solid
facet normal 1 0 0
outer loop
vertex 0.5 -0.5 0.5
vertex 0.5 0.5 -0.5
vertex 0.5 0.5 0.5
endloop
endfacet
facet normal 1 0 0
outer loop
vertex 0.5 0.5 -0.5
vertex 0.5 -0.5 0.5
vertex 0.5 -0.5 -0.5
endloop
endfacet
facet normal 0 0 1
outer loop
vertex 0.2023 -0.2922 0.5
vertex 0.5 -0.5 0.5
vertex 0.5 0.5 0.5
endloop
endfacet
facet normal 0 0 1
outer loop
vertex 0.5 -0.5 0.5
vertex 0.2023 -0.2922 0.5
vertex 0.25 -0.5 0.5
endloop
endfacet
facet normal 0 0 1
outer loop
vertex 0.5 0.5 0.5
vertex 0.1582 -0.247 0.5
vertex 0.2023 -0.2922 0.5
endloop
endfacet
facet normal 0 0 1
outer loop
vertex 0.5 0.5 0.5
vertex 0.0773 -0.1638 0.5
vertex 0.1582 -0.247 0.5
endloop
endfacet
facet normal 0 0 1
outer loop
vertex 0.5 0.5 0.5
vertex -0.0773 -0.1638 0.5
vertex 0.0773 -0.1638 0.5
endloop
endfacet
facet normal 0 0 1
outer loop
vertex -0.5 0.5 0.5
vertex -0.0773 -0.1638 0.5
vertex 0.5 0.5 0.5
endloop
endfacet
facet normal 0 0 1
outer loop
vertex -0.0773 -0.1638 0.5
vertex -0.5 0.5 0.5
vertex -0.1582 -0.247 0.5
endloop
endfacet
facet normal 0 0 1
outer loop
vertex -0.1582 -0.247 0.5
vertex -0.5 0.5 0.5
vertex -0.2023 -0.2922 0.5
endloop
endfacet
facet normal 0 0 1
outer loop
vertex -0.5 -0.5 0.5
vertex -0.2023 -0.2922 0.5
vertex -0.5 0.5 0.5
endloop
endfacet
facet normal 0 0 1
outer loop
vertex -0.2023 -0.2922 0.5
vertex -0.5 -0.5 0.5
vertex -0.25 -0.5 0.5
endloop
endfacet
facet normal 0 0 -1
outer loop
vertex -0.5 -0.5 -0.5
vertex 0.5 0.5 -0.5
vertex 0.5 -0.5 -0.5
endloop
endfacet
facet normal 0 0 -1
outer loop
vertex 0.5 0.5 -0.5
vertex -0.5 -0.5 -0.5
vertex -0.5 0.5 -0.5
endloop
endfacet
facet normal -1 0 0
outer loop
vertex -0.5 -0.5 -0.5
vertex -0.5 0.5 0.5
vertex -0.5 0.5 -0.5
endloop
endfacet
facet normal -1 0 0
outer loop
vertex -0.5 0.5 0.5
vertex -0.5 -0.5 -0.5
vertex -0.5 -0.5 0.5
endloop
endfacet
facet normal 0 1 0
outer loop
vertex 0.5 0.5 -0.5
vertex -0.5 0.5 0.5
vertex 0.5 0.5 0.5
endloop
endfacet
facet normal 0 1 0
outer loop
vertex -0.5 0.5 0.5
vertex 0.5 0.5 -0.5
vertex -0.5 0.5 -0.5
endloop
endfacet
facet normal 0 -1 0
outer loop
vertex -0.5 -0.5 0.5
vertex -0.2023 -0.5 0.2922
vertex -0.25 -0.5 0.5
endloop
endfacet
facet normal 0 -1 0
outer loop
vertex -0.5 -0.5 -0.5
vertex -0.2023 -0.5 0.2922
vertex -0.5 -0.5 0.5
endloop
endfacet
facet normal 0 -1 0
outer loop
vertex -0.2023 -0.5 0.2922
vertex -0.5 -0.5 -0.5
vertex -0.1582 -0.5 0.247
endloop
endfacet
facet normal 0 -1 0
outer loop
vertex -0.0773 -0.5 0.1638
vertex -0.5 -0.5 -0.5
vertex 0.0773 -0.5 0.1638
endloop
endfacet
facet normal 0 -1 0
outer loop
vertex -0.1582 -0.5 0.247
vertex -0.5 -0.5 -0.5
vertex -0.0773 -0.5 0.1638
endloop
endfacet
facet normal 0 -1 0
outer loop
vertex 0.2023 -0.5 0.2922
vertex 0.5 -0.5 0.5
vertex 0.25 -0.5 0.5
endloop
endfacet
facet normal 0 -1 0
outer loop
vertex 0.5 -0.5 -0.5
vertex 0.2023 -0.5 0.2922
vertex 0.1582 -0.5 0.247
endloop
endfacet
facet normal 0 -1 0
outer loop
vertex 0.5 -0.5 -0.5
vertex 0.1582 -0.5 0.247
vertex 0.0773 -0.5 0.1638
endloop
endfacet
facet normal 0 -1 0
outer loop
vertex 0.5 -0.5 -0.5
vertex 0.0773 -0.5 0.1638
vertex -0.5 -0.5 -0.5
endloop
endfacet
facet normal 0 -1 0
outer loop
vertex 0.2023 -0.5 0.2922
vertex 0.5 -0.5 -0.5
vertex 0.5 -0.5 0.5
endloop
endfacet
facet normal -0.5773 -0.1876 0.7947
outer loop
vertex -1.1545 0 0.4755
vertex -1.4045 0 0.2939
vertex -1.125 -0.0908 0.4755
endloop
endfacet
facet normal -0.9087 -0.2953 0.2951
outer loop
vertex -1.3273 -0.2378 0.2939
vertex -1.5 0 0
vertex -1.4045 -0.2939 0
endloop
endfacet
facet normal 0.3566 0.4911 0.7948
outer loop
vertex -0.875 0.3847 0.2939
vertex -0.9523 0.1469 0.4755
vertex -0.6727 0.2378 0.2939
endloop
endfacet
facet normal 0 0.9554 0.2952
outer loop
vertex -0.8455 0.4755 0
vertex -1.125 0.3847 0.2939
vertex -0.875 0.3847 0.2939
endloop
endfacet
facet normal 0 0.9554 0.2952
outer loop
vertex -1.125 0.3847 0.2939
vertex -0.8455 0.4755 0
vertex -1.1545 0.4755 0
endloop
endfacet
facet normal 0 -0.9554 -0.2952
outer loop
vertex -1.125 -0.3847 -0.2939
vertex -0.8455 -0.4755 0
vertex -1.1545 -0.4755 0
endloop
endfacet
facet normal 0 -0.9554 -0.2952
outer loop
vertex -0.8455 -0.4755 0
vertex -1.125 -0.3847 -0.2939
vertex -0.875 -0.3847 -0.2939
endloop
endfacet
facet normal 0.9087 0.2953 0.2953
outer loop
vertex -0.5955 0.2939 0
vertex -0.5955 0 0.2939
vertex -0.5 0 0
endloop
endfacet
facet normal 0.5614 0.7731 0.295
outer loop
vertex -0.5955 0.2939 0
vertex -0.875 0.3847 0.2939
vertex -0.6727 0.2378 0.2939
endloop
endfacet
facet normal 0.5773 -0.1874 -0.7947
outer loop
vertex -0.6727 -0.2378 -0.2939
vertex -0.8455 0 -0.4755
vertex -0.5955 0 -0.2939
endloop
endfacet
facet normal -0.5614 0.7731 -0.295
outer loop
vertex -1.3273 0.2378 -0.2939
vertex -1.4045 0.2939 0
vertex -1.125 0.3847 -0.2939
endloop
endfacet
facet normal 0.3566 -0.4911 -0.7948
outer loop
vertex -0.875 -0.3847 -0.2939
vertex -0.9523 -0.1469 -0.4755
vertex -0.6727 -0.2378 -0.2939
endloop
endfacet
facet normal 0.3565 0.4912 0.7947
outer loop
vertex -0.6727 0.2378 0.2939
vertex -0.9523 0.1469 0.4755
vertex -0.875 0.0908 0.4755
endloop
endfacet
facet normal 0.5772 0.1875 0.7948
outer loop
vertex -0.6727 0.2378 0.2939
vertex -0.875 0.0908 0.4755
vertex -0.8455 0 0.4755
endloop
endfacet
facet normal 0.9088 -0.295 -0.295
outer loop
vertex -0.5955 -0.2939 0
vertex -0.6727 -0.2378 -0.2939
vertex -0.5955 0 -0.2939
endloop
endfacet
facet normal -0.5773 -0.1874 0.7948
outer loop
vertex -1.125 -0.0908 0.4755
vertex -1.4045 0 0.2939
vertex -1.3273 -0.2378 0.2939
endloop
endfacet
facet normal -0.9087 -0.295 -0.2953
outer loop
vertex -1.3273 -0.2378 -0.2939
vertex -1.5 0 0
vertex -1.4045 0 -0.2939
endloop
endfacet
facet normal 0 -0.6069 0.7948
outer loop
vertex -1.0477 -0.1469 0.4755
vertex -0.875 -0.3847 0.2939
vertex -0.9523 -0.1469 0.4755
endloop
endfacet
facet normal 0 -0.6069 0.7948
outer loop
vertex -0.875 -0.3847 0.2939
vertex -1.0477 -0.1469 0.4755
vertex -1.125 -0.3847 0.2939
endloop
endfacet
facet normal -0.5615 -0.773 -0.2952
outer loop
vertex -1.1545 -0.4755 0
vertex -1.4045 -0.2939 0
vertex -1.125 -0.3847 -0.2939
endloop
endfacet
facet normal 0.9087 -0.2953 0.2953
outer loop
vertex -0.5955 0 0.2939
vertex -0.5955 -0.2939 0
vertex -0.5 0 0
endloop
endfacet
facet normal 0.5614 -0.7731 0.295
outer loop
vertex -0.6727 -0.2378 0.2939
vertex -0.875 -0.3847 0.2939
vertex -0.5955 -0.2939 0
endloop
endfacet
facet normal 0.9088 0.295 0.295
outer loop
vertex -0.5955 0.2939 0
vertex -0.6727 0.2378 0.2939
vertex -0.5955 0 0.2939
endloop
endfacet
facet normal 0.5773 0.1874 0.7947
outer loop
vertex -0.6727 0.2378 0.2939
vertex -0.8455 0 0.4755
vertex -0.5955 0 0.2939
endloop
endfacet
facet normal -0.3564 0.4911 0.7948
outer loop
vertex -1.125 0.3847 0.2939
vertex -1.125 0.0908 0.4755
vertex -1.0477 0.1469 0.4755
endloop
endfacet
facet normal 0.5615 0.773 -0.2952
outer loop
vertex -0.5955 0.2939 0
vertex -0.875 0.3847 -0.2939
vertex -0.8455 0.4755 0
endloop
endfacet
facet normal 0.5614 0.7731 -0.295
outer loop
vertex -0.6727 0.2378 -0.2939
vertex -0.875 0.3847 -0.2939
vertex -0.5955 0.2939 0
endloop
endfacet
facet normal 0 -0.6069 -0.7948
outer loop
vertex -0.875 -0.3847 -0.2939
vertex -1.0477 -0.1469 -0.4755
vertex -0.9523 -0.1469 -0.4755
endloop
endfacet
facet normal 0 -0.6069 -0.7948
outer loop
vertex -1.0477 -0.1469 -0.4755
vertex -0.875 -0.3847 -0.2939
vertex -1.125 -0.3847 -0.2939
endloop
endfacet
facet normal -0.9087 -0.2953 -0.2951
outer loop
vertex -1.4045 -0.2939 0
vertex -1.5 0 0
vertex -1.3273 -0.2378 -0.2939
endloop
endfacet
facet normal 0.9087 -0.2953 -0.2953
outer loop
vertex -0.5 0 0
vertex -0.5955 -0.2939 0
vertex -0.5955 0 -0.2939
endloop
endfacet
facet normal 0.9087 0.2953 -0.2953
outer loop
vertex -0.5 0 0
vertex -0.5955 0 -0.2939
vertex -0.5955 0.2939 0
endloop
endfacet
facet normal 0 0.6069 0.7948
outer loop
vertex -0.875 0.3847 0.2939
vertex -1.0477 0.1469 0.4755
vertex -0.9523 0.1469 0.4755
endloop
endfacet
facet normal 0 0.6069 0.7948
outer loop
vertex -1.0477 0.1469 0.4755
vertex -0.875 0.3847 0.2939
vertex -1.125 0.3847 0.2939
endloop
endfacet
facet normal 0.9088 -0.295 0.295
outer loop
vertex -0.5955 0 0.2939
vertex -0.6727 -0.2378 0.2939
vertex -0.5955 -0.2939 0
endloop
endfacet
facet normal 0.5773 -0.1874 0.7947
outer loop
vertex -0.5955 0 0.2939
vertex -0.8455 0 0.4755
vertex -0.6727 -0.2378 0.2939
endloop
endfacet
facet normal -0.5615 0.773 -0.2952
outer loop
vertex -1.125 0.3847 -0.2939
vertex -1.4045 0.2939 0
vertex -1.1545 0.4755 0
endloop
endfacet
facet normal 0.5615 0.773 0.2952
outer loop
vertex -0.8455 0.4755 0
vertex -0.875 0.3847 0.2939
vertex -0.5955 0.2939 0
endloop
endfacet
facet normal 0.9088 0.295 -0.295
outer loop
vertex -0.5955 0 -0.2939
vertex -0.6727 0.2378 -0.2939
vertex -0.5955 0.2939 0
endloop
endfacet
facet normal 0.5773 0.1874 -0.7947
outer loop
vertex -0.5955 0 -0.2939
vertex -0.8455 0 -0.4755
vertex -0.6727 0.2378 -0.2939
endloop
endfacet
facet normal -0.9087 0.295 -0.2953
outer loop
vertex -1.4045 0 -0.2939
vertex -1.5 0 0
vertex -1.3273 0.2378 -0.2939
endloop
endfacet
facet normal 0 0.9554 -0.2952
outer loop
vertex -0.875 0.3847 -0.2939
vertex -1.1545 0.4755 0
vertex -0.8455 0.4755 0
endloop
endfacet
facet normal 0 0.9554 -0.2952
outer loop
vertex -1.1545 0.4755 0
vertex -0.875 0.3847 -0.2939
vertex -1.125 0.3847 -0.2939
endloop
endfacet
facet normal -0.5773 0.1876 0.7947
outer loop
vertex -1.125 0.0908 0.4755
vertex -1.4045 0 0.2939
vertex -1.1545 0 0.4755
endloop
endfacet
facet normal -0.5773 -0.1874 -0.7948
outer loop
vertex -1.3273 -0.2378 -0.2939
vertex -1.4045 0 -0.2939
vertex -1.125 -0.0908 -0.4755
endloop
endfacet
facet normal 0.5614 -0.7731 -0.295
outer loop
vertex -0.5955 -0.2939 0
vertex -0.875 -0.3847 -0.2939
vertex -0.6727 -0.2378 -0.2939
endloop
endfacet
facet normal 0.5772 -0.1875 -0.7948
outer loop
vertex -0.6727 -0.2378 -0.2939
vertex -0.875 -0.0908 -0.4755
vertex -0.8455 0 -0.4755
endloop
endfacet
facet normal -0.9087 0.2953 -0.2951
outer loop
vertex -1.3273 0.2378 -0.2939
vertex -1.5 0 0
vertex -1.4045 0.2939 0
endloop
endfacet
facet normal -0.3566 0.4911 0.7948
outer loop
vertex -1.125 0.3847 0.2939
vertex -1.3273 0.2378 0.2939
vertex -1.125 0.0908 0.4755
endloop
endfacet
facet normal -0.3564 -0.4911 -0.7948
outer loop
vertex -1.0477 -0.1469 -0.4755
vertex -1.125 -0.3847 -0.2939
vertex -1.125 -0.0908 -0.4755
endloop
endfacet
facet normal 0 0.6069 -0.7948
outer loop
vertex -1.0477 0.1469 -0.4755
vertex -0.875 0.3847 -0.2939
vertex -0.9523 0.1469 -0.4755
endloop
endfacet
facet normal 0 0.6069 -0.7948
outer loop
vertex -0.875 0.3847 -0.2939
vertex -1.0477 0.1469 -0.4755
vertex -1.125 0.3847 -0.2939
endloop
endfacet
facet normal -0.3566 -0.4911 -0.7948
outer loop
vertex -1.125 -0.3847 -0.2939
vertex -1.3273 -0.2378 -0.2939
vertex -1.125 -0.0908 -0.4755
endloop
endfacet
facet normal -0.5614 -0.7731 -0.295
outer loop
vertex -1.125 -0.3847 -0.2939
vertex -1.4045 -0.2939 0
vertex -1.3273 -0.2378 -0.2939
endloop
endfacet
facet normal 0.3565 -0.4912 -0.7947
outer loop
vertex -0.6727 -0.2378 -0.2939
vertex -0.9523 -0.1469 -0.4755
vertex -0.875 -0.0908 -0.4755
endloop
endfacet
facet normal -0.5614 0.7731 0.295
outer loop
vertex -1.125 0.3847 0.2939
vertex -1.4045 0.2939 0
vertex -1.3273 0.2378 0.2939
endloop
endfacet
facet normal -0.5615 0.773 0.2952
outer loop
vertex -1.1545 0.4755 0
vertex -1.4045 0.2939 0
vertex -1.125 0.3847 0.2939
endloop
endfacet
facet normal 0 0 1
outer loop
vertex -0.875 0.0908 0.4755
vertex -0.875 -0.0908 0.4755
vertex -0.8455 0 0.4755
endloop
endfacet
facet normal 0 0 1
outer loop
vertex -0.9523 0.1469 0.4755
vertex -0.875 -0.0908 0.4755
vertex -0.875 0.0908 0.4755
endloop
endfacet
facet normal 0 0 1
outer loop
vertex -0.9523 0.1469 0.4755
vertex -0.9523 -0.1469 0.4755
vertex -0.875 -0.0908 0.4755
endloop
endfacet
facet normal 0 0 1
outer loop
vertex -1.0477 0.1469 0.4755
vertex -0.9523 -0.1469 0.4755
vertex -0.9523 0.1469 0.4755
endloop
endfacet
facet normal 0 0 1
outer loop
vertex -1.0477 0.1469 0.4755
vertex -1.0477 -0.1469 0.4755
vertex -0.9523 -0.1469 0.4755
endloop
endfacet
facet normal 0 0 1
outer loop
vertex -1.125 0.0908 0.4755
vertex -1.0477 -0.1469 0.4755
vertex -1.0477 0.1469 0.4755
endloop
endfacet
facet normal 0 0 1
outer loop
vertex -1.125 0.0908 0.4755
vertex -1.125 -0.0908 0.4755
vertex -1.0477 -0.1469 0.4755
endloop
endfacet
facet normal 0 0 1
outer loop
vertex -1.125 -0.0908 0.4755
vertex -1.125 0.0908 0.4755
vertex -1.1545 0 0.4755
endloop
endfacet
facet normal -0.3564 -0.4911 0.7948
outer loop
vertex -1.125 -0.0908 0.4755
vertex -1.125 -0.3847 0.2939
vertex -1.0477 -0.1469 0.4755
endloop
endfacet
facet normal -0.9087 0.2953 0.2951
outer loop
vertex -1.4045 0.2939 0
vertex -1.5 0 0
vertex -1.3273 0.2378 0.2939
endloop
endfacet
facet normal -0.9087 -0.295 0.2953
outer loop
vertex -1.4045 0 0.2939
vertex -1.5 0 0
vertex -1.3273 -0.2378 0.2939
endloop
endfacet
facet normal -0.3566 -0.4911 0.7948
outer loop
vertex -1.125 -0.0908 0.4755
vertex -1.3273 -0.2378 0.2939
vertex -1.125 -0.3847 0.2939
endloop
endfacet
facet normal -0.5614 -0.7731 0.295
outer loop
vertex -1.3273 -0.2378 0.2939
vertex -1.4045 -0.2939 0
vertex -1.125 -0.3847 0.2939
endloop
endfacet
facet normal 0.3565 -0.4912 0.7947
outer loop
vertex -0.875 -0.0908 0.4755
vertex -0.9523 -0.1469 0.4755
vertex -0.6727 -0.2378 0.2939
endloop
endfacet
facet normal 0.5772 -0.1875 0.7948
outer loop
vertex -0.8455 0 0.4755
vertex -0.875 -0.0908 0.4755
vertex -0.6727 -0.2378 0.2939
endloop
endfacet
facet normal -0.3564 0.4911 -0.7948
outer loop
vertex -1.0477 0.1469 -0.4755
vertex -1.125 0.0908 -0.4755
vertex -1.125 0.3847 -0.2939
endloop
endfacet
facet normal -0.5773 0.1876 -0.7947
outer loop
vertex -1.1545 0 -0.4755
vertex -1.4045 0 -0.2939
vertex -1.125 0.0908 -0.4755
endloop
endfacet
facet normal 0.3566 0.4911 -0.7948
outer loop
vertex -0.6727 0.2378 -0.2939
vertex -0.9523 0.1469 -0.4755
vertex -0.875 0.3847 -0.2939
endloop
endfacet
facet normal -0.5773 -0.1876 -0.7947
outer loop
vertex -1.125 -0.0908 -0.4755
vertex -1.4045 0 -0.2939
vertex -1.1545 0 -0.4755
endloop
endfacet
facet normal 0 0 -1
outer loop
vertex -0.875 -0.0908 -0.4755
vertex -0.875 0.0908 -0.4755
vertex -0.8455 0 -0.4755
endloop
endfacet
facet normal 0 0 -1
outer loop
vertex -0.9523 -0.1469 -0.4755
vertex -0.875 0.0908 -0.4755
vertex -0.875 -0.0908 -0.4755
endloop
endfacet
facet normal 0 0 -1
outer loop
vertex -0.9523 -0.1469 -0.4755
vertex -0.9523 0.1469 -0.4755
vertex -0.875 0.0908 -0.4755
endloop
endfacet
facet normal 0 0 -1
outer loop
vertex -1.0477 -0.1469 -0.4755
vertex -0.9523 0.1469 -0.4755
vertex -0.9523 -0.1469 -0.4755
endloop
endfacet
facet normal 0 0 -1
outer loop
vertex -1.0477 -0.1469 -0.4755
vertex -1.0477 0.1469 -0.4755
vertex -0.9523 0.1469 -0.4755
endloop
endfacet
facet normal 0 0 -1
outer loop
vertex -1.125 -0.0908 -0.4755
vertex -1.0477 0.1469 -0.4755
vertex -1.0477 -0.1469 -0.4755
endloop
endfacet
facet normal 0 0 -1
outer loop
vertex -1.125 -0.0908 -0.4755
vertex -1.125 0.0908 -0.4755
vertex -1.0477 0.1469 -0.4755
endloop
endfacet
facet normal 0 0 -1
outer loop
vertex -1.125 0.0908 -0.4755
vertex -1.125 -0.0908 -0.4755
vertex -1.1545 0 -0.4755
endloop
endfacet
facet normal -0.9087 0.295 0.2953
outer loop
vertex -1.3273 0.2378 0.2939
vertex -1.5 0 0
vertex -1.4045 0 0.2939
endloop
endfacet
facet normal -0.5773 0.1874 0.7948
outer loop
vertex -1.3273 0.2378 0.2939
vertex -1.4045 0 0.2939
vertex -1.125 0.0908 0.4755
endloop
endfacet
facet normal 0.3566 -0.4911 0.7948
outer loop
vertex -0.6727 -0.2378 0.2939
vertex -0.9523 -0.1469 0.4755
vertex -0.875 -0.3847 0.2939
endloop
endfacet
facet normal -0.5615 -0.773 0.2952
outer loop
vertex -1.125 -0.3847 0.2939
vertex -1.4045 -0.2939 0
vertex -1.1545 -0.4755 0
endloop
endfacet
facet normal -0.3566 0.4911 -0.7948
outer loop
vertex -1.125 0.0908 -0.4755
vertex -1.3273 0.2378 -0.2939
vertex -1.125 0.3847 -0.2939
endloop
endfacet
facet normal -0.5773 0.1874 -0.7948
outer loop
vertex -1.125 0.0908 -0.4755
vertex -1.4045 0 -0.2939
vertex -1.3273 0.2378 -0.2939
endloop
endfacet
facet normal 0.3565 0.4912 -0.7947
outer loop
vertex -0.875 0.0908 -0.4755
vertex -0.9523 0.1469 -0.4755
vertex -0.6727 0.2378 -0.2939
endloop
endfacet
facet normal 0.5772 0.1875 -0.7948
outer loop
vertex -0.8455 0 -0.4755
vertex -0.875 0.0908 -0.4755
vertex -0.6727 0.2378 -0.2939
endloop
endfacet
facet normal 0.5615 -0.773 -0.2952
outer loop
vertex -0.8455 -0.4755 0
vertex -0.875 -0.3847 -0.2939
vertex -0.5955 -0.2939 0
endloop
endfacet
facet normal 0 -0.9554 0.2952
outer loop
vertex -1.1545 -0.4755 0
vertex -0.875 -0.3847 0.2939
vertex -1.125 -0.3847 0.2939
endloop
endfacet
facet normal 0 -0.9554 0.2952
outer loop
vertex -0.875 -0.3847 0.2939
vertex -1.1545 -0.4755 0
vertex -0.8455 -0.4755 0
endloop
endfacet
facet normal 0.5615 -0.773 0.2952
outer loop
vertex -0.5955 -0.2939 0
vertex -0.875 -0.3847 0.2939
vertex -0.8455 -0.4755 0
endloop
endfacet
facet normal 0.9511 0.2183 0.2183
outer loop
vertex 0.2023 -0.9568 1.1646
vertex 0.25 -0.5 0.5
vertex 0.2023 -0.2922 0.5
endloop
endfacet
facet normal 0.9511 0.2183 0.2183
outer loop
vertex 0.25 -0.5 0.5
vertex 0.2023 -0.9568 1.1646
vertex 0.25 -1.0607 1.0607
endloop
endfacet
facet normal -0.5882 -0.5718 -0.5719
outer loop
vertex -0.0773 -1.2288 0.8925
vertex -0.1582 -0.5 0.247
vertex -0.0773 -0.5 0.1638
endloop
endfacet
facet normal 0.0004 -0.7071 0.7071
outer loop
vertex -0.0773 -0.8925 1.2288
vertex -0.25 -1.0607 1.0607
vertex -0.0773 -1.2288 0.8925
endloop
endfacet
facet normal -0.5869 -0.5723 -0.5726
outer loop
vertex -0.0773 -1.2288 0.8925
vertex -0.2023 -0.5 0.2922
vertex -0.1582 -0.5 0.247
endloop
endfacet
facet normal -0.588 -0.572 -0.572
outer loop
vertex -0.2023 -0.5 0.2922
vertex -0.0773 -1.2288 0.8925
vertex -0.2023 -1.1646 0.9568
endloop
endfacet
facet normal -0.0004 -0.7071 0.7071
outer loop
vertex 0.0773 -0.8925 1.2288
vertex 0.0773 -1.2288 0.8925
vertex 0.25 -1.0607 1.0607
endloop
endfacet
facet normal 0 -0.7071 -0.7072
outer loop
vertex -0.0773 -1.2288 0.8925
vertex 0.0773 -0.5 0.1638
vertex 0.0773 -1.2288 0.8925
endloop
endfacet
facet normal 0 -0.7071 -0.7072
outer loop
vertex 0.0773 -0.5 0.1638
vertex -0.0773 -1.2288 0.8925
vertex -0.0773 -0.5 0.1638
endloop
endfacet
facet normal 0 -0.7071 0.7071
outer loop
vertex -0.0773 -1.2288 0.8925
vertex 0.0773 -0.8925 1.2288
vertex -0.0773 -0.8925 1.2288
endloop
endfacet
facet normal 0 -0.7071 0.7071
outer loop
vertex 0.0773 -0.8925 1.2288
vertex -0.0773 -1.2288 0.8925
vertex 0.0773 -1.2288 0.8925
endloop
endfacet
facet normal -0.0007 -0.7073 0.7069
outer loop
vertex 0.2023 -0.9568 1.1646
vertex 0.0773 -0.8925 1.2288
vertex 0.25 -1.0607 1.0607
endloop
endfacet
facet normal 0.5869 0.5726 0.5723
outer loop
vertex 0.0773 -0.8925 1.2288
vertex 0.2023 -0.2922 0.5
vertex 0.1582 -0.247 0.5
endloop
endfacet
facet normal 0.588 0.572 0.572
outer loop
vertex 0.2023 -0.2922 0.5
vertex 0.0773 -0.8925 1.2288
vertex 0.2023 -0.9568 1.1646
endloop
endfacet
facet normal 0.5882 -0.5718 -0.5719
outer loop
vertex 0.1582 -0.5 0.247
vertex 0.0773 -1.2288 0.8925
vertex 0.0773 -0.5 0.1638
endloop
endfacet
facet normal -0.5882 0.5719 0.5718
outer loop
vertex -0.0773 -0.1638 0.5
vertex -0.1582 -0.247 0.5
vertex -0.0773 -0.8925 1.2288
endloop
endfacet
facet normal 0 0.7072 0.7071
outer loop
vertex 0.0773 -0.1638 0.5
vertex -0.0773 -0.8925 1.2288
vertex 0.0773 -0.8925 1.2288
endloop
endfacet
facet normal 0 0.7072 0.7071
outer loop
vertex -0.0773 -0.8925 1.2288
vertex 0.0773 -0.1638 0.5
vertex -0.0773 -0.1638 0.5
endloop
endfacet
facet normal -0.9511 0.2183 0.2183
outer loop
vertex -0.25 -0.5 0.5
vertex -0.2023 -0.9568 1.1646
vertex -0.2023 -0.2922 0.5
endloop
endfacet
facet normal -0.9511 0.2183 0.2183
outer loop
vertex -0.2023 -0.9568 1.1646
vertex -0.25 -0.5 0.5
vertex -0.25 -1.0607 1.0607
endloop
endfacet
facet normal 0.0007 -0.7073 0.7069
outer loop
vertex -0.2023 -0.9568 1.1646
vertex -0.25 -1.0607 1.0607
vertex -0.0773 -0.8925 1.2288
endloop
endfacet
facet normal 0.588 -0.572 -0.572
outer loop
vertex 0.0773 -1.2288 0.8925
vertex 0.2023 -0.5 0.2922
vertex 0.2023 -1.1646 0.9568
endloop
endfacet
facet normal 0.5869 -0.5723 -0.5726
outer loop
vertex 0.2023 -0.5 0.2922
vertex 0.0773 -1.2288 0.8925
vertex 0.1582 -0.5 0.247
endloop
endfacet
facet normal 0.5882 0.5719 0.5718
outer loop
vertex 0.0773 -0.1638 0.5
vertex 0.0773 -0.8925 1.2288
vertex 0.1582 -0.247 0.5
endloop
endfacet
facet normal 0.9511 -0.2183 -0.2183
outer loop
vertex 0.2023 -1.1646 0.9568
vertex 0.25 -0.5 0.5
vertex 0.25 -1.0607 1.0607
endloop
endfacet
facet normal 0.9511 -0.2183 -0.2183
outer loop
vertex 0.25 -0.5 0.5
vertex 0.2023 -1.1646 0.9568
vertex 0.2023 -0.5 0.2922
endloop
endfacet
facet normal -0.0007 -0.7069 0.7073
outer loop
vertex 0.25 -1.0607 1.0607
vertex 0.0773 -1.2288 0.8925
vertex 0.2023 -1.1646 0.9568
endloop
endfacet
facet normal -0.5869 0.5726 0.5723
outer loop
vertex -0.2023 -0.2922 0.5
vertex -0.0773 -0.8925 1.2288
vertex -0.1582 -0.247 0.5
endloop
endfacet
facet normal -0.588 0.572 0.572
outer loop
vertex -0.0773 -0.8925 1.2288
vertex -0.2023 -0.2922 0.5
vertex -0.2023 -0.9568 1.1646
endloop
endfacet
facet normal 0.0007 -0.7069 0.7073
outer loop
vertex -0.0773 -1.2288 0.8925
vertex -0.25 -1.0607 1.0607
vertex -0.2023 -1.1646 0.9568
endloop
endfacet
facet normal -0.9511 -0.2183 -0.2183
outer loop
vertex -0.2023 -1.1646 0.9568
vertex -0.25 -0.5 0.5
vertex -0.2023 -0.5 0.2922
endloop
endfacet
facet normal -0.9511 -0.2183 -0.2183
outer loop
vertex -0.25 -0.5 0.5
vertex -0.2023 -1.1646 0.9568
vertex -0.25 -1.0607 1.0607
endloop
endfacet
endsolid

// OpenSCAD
$fn=10;
cube([1,1,1],center=true);
translate([-1,0,0]) sphere(r=0.5);
rotate([45,0,0]) cylinder(r=0.25,h=1.5);
